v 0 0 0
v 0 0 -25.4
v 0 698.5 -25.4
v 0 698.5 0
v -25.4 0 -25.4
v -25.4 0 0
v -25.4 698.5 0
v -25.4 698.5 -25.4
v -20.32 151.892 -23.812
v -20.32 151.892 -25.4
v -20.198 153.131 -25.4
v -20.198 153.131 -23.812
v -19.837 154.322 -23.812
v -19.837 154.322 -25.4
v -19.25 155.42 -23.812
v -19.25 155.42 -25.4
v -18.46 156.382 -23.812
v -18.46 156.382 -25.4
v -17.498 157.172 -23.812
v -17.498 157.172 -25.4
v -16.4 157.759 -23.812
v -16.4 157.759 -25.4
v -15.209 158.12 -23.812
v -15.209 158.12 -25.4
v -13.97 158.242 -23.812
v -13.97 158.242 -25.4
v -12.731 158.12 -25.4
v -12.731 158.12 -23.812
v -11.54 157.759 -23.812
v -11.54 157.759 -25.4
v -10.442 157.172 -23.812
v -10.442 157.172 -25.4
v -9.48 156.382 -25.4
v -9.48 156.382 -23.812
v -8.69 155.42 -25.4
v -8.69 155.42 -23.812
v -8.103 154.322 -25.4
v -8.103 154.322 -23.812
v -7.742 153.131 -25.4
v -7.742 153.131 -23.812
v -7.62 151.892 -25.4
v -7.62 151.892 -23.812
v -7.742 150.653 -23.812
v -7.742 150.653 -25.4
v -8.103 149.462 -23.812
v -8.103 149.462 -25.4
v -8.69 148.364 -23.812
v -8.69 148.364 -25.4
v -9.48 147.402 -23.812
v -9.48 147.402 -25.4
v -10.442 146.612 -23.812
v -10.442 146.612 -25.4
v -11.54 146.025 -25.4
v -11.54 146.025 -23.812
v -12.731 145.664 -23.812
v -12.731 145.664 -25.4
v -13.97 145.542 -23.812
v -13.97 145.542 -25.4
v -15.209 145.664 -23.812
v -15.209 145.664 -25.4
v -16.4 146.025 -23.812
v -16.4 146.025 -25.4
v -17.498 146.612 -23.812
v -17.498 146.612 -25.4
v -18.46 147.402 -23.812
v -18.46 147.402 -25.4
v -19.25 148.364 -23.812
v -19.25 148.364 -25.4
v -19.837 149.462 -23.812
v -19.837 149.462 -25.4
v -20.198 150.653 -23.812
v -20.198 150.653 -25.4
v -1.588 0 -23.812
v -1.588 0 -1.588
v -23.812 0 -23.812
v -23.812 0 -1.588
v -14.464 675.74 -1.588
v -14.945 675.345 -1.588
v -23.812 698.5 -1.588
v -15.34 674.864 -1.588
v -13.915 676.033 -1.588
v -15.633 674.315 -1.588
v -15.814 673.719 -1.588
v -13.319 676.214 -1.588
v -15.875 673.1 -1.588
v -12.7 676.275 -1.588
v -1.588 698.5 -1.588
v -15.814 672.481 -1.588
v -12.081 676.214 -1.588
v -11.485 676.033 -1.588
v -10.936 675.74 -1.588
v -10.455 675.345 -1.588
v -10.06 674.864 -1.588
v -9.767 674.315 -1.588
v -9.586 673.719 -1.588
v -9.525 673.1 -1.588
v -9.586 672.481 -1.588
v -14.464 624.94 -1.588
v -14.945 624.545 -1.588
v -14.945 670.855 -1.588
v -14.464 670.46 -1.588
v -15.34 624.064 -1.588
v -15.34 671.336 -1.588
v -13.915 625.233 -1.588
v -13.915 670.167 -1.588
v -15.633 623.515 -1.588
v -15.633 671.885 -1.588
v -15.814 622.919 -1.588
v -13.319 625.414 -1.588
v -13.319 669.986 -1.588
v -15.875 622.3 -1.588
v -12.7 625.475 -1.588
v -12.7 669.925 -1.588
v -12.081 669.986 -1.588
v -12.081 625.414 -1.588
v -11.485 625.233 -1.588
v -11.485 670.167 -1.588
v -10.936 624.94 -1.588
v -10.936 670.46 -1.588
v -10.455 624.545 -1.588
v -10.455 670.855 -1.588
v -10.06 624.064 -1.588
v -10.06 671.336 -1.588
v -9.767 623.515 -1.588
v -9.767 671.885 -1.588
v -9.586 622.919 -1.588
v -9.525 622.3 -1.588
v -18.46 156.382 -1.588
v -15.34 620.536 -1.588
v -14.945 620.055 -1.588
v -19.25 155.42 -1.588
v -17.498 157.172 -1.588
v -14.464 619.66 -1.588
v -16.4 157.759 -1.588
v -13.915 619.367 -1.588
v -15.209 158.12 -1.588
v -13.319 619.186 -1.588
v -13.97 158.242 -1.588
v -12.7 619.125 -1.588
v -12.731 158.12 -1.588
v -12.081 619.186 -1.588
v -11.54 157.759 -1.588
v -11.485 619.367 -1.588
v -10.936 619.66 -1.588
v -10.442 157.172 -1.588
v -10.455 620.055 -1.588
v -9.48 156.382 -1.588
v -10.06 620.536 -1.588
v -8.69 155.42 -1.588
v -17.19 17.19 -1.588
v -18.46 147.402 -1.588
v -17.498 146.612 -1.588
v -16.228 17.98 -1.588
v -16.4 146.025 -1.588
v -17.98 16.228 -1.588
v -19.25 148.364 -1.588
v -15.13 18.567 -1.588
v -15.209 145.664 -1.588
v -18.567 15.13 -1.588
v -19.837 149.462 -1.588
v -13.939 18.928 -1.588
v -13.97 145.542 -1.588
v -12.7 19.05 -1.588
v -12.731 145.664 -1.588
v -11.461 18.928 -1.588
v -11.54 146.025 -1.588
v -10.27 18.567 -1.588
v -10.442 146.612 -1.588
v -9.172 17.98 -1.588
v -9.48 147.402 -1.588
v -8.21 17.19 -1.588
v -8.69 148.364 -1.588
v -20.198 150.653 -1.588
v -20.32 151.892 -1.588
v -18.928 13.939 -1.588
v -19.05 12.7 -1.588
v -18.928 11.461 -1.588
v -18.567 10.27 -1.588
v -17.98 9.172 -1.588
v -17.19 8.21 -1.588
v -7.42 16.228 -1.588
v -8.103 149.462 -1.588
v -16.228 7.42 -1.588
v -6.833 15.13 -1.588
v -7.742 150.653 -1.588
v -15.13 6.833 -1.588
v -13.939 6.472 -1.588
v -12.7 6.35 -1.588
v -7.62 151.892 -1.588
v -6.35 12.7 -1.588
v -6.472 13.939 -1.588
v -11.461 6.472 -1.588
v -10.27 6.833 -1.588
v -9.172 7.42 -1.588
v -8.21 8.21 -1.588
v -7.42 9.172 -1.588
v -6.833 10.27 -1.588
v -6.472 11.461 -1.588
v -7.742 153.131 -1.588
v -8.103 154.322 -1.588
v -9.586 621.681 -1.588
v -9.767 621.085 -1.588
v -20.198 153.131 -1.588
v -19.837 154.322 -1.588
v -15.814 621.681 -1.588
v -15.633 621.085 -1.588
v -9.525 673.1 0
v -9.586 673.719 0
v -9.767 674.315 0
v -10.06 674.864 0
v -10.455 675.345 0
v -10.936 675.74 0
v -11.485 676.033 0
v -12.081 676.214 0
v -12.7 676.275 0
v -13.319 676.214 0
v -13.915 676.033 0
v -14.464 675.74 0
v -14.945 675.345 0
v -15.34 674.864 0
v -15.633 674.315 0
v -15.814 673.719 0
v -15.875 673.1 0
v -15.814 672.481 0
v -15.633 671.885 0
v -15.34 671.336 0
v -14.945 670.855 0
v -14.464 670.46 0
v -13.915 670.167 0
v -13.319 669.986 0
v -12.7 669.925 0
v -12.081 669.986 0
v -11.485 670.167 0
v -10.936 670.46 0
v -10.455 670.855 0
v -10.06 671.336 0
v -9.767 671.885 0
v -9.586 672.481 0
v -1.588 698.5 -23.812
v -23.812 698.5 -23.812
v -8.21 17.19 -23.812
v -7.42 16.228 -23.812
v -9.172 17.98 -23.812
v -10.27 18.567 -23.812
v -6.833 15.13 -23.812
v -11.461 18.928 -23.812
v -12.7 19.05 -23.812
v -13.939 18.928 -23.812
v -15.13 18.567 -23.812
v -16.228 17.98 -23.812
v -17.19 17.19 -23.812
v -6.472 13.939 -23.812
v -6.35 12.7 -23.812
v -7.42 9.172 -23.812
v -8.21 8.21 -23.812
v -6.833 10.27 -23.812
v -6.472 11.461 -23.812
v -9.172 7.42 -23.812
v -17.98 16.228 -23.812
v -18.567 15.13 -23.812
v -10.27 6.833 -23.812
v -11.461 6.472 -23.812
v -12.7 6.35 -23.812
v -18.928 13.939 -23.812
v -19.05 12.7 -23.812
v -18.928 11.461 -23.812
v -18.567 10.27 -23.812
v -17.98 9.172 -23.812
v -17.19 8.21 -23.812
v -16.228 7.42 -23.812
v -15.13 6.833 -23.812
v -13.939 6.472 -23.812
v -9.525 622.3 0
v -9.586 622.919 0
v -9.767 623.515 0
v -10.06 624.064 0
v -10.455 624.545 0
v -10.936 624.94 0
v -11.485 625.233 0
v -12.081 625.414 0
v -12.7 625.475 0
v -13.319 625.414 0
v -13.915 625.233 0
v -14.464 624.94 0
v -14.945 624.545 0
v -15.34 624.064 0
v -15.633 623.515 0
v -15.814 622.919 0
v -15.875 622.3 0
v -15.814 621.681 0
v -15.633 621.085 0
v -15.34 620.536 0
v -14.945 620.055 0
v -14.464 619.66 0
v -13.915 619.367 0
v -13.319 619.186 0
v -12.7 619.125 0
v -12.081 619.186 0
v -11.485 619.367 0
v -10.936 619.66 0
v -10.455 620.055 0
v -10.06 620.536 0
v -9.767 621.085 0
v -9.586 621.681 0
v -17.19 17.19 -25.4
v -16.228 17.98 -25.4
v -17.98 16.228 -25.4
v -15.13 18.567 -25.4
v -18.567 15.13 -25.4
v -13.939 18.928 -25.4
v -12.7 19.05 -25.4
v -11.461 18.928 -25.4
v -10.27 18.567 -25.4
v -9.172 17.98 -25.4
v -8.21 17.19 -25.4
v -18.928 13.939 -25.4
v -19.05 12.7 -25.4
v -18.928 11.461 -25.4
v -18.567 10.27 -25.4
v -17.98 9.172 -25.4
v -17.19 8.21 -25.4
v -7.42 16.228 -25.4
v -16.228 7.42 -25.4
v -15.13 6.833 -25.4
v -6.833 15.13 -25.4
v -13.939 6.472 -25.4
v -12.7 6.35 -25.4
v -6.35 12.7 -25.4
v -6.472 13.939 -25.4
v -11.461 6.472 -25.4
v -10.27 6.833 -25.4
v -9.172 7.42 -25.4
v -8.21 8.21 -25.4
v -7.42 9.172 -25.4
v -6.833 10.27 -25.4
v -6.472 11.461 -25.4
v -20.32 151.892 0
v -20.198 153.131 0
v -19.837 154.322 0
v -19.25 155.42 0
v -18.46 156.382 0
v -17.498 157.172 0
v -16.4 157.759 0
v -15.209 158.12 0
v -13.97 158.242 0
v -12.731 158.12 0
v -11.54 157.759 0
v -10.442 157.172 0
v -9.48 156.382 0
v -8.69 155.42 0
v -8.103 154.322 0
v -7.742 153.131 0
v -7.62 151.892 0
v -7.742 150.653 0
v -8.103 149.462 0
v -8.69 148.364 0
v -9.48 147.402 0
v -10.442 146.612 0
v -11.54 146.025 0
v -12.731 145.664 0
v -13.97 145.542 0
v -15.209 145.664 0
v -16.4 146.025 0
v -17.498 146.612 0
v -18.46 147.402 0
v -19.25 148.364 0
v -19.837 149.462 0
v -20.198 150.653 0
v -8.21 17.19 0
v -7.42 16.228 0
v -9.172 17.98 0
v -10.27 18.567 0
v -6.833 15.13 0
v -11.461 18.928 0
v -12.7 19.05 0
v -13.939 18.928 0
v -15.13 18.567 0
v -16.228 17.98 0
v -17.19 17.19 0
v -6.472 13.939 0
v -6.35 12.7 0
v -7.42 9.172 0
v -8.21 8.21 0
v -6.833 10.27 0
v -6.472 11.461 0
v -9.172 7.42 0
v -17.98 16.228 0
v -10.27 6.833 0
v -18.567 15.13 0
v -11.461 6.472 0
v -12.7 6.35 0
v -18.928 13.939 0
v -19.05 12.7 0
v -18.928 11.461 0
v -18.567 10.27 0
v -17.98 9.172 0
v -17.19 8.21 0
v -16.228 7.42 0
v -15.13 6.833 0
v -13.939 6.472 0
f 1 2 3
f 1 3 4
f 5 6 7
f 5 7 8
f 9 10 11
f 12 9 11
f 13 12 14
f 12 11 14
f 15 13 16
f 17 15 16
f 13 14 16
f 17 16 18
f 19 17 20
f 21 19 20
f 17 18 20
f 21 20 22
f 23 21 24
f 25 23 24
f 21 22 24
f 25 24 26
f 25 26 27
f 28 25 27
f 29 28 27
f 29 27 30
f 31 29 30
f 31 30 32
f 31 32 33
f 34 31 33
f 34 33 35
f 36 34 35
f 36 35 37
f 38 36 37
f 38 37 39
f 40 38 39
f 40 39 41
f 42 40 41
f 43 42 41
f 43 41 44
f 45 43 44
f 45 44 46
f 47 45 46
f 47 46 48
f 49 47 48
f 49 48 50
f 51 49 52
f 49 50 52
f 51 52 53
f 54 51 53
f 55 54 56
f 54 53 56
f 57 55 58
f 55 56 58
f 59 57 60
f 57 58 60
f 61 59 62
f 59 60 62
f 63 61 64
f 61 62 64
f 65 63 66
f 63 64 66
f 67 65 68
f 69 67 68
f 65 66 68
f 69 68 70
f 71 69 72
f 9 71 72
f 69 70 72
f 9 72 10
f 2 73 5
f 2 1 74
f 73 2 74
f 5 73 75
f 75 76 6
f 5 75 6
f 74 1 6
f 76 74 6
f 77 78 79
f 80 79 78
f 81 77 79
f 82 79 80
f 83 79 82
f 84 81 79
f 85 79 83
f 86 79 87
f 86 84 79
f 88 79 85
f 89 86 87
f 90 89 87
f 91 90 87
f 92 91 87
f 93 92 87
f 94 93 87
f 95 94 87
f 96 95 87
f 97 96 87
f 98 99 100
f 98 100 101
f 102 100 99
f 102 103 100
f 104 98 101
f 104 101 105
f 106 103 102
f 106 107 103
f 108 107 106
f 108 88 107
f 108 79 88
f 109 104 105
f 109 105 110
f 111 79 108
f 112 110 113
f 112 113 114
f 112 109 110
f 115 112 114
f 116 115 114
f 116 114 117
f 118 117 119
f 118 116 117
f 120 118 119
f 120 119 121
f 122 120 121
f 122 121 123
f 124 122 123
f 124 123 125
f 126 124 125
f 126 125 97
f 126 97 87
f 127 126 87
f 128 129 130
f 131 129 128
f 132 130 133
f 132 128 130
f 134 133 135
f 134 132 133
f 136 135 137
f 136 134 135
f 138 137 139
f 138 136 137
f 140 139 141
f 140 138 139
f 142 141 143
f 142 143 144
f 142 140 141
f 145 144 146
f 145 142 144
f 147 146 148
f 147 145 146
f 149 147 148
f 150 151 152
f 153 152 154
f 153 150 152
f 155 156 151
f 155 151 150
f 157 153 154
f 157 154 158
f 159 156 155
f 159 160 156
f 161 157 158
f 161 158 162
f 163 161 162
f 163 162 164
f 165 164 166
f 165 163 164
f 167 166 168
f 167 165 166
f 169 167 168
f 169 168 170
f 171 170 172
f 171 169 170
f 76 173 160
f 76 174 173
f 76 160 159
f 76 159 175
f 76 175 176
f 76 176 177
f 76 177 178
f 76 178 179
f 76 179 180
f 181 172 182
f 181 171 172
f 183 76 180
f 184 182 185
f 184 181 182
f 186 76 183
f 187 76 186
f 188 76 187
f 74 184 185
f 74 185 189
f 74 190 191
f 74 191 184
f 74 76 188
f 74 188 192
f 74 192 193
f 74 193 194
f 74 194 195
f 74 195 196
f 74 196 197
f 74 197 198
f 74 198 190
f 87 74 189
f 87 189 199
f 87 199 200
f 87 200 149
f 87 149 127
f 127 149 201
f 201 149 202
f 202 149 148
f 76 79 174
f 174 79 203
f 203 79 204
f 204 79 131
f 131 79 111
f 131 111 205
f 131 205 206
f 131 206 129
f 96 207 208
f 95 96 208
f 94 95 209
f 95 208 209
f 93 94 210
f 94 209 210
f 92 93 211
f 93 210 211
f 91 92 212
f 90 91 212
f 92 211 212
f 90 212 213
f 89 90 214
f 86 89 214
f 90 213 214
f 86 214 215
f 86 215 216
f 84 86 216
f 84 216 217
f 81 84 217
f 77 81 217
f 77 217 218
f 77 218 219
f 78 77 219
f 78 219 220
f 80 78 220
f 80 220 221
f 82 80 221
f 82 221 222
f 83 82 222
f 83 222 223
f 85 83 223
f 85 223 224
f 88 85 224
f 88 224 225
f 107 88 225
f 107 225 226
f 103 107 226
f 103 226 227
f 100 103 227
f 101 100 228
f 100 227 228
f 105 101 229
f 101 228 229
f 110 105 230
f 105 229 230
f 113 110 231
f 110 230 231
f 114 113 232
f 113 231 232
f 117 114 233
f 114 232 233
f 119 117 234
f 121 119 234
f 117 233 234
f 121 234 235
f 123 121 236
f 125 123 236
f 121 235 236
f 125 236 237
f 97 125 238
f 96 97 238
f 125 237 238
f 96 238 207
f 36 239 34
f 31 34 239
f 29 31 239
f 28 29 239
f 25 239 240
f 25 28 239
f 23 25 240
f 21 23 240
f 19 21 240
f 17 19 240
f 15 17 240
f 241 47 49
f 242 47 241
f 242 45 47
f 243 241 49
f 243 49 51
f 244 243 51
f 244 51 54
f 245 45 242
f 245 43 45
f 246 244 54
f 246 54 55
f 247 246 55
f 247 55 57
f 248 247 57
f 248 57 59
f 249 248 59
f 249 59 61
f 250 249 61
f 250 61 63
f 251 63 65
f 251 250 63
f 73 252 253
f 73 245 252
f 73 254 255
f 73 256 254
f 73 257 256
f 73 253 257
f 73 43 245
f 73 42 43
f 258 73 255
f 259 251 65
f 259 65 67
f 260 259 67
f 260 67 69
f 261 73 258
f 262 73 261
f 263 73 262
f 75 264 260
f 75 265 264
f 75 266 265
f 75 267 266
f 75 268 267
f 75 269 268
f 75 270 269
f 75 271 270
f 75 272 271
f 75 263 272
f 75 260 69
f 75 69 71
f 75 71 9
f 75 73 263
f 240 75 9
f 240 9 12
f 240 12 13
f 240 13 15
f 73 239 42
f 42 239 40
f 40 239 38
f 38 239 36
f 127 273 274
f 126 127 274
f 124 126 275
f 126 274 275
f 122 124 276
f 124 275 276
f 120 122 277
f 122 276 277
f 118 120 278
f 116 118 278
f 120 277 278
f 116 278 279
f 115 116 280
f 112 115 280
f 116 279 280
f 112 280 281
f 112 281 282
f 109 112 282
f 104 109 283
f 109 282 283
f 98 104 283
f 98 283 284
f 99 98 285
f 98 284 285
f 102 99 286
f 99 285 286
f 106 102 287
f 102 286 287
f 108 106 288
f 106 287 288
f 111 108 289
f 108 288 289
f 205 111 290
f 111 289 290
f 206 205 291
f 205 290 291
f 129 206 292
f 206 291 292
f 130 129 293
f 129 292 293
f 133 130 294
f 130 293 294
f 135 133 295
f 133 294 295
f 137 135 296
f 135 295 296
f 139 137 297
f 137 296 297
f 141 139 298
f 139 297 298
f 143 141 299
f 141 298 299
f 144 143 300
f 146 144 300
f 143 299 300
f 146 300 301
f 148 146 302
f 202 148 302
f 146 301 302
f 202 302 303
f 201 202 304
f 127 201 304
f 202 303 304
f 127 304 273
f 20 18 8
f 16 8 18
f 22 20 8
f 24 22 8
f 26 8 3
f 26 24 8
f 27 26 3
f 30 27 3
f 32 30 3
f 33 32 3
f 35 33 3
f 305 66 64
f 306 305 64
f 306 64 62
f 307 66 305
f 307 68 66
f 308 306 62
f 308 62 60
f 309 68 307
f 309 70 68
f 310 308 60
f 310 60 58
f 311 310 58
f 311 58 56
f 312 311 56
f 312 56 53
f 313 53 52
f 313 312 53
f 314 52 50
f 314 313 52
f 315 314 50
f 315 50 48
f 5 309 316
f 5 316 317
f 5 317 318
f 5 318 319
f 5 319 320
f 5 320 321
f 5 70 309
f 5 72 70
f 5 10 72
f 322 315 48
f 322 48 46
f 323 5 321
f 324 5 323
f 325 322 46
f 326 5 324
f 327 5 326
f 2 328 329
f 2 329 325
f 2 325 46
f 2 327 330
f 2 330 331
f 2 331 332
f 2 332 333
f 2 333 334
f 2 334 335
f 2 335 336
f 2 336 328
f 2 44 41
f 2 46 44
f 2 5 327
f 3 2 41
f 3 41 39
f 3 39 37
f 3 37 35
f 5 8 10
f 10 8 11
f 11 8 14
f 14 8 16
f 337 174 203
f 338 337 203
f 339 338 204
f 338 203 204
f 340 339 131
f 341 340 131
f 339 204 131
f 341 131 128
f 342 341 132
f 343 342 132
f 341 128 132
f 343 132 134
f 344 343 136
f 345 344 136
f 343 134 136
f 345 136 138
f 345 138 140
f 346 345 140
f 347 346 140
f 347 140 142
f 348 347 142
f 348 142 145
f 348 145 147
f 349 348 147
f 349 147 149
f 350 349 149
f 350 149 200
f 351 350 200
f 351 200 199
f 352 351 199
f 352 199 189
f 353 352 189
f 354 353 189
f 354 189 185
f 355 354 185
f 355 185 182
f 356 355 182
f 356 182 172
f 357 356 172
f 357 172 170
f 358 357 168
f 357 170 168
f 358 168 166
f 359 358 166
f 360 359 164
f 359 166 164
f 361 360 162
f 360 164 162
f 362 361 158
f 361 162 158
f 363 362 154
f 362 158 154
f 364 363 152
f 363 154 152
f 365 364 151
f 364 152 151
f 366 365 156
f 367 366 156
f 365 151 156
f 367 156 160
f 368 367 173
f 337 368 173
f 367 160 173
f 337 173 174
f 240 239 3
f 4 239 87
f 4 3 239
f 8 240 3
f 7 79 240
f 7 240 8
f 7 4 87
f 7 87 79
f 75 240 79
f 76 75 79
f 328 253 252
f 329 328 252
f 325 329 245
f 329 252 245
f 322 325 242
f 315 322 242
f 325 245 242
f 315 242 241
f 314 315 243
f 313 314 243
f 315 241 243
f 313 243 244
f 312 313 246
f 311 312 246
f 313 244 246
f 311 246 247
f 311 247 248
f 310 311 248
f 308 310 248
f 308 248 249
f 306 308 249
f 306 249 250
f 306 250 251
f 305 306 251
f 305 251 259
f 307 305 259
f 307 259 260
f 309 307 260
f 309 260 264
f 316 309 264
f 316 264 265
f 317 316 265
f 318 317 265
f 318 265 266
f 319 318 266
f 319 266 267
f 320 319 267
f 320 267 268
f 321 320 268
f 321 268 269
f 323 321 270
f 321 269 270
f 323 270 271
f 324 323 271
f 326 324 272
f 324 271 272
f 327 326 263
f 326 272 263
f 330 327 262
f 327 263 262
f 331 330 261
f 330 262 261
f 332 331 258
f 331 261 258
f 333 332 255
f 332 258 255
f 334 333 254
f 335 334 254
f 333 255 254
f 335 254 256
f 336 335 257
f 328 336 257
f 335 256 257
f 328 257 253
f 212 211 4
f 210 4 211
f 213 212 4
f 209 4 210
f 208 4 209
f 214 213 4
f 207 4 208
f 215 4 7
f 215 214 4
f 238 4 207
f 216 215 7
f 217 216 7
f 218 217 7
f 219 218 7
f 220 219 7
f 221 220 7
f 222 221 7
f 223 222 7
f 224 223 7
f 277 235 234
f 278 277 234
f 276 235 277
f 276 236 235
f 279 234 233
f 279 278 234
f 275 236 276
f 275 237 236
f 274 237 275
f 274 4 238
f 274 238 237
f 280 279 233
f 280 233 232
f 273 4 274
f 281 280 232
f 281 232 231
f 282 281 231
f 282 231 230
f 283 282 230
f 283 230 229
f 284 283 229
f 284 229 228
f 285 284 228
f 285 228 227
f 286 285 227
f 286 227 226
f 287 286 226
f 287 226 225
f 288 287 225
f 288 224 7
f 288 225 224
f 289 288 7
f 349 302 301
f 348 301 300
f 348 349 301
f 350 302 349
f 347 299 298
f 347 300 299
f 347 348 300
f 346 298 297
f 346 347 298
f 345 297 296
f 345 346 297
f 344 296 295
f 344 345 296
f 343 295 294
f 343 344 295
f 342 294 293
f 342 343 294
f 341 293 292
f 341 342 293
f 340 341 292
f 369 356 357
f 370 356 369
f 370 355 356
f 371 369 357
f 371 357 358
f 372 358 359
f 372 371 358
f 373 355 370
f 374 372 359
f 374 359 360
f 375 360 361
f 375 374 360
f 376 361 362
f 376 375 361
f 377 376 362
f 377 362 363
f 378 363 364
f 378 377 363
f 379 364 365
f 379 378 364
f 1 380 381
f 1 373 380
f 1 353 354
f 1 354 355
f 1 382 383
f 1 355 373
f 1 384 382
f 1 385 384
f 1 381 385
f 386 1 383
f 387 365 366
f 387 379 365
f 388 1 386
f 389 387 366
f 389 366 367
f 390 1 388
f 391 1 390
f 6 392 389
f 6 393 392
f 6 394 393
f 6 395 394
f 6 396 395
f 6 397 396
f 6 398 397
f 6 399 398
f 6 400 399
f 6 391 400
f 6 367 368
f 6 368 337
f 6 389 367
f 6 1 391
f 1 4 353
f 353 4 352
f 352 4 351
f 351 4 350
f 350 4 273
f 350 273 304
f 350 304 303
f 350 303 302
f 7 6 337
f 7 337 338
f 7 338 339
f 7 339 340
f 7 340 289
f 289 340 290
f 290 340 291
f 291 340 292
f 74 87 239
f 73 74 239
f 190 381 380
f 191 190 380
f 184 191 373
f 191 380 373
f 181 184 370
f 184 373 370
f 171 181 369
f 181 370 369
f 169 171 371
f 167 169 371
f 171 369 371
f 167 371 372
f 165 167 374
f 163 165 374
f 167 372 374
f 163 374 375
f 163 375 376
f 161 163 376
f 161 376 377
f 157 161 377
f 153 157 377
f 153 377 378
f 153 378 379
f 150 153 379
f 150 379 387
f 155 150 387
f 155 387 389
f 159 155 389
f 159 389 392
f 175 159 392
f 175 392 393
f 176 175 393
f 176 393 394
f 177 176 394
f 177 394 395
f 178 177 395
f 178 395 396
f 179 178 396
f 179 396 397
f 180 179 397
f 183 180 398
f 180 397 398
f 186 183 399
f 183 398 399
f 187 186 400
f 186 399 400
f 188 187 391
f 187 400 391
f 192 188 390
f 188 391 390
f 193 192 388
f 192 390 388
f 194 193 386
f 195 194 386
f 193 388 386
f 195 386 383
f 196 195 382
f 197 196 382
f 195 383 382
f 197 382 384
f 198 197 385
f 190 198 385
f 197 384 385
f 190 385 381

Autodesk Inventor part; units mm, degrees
ref_plane "YZ Plane" through (0, 0, 0) normal (1, 0, 0) x (0, 1, 0)
ref_plane "XZ Plane" through (0, 0, 0) normal (0, 1, 0) x (-1, 0, 0)
ref_plane "XY Plane" through (0, 0, 0) normal (0, 0, 1) x (1, 0, 0)
sketch "Sketch1" plane through (0, 0, 0) normal (0, 1, 0) x (-1, 0, 0)
  line L0 (0, 0) -> (25.4, 0)
  line L1 (25.4, 0) -> (25.4, -25.4)
  line L2 (25.4, -25.4) -> (0, -25.4)
  line L3 (0, -25.4) -> (0, 0)
  line L4 (23.8125, -23.8125) -> (23.8125, -1.5875)
  line L5 (23.8125, -1.5875) -> (1.5875, -1.5875)
  line L6 (1.5875, -1.5875) -> (1.5875, -23.8125)
  line L7 (1.5875, -23.8125) -> (23.8125, -23.8125)
  dimension "d0" = 25.4
  dimension "d1" = 25.4
  dimension "d2" = 1.5875
extrude "Extrusion1" add sketch "Sketch1" along normal blind 698.5
sketch "Sketch2" plane through (-25.4, 0, 0) normal (0, 0, 1) x (1, 0, 0)
  circle A0 centre (12.7, 12.7) radius 6.35
  line L0 (25.4, 0) -> (0, 0) projected
  dimension "d5" = 12.7
  dimension "d6" = 12.7
extrude "Extrusion2" cut sketch "Sketch2" against normal blind 25.4
sketch "Sketch7" plane through (0, 0, -25.4) normal (0, 0, -1) x (-1, 0, 0)
  circle A0 centre (13.97, 151.892) radius 6.35
  line L0 (25.4, 0) -> (0, 0) projected
  line L1 (25.4, 0) -> (25.4, 698.5) projected
  dimension "d26" = 12.7
  dimension "d27" = 151.892
  dimension "d31" = 11.43
extrude "Extrusion7" cut sketch "Sketch7" against normal blind 25.4
sketch "Sketch11" plane through (0, 0, -25.4) normal (0, 0, -1) x (-1, 0, 0)
  line L0 (0, 698.5) -> (25.4, 698.5) projected
  line L1 (0, 0) -> (0, 698.5) projected
  line L2 (0, 723.9) -> (0, 669.7136)
  arc A0 (0, 669.7136) -> (-29.6572, 670.9249) centre (-16.2109, 636.4744) ccw projected
  line L3 (-29.6572, 670.9249) -> (-33.1564, 670.9249) projected
  line L4 (-29.6572, 670.9249) -> (-33.1564, 670.9249)
  arc A1 (0, 669.7136) -> (-29.6572, 670.9249) centre (-16.2109, 636.4744) ccw
  arc A2 (0, 723.9) -> (-33.1564, 670.9249) centre (3.7035, 684.7184) ccw
  point P0 (25.4, 698.5)
extrude "Extrusion11" cut sketch "Sketch11" against normal blind 25.4
sketch "Sketch12" plane through (-25.4, 0, 0) normal (0, 0, 1) x (1, 0, 0)
  line L0 (25.4, 698.5) -> (0, 698.5) projected
  circle A0 centre (12.7, 673.1) radius 3.175
  circle A1 centre (12.7, 622.3) radius 3.175
  point P0 (25.4, 0)
  dimension "d46" = 6.35
  dimension "d47" = 25.4
  dimension "d48" = 6.35
  dimension "d50" = 76.2
extrude "Extrusion12" cut sketch "Sketch12" against normal blind 1.5875
properties part number "AP 3"
